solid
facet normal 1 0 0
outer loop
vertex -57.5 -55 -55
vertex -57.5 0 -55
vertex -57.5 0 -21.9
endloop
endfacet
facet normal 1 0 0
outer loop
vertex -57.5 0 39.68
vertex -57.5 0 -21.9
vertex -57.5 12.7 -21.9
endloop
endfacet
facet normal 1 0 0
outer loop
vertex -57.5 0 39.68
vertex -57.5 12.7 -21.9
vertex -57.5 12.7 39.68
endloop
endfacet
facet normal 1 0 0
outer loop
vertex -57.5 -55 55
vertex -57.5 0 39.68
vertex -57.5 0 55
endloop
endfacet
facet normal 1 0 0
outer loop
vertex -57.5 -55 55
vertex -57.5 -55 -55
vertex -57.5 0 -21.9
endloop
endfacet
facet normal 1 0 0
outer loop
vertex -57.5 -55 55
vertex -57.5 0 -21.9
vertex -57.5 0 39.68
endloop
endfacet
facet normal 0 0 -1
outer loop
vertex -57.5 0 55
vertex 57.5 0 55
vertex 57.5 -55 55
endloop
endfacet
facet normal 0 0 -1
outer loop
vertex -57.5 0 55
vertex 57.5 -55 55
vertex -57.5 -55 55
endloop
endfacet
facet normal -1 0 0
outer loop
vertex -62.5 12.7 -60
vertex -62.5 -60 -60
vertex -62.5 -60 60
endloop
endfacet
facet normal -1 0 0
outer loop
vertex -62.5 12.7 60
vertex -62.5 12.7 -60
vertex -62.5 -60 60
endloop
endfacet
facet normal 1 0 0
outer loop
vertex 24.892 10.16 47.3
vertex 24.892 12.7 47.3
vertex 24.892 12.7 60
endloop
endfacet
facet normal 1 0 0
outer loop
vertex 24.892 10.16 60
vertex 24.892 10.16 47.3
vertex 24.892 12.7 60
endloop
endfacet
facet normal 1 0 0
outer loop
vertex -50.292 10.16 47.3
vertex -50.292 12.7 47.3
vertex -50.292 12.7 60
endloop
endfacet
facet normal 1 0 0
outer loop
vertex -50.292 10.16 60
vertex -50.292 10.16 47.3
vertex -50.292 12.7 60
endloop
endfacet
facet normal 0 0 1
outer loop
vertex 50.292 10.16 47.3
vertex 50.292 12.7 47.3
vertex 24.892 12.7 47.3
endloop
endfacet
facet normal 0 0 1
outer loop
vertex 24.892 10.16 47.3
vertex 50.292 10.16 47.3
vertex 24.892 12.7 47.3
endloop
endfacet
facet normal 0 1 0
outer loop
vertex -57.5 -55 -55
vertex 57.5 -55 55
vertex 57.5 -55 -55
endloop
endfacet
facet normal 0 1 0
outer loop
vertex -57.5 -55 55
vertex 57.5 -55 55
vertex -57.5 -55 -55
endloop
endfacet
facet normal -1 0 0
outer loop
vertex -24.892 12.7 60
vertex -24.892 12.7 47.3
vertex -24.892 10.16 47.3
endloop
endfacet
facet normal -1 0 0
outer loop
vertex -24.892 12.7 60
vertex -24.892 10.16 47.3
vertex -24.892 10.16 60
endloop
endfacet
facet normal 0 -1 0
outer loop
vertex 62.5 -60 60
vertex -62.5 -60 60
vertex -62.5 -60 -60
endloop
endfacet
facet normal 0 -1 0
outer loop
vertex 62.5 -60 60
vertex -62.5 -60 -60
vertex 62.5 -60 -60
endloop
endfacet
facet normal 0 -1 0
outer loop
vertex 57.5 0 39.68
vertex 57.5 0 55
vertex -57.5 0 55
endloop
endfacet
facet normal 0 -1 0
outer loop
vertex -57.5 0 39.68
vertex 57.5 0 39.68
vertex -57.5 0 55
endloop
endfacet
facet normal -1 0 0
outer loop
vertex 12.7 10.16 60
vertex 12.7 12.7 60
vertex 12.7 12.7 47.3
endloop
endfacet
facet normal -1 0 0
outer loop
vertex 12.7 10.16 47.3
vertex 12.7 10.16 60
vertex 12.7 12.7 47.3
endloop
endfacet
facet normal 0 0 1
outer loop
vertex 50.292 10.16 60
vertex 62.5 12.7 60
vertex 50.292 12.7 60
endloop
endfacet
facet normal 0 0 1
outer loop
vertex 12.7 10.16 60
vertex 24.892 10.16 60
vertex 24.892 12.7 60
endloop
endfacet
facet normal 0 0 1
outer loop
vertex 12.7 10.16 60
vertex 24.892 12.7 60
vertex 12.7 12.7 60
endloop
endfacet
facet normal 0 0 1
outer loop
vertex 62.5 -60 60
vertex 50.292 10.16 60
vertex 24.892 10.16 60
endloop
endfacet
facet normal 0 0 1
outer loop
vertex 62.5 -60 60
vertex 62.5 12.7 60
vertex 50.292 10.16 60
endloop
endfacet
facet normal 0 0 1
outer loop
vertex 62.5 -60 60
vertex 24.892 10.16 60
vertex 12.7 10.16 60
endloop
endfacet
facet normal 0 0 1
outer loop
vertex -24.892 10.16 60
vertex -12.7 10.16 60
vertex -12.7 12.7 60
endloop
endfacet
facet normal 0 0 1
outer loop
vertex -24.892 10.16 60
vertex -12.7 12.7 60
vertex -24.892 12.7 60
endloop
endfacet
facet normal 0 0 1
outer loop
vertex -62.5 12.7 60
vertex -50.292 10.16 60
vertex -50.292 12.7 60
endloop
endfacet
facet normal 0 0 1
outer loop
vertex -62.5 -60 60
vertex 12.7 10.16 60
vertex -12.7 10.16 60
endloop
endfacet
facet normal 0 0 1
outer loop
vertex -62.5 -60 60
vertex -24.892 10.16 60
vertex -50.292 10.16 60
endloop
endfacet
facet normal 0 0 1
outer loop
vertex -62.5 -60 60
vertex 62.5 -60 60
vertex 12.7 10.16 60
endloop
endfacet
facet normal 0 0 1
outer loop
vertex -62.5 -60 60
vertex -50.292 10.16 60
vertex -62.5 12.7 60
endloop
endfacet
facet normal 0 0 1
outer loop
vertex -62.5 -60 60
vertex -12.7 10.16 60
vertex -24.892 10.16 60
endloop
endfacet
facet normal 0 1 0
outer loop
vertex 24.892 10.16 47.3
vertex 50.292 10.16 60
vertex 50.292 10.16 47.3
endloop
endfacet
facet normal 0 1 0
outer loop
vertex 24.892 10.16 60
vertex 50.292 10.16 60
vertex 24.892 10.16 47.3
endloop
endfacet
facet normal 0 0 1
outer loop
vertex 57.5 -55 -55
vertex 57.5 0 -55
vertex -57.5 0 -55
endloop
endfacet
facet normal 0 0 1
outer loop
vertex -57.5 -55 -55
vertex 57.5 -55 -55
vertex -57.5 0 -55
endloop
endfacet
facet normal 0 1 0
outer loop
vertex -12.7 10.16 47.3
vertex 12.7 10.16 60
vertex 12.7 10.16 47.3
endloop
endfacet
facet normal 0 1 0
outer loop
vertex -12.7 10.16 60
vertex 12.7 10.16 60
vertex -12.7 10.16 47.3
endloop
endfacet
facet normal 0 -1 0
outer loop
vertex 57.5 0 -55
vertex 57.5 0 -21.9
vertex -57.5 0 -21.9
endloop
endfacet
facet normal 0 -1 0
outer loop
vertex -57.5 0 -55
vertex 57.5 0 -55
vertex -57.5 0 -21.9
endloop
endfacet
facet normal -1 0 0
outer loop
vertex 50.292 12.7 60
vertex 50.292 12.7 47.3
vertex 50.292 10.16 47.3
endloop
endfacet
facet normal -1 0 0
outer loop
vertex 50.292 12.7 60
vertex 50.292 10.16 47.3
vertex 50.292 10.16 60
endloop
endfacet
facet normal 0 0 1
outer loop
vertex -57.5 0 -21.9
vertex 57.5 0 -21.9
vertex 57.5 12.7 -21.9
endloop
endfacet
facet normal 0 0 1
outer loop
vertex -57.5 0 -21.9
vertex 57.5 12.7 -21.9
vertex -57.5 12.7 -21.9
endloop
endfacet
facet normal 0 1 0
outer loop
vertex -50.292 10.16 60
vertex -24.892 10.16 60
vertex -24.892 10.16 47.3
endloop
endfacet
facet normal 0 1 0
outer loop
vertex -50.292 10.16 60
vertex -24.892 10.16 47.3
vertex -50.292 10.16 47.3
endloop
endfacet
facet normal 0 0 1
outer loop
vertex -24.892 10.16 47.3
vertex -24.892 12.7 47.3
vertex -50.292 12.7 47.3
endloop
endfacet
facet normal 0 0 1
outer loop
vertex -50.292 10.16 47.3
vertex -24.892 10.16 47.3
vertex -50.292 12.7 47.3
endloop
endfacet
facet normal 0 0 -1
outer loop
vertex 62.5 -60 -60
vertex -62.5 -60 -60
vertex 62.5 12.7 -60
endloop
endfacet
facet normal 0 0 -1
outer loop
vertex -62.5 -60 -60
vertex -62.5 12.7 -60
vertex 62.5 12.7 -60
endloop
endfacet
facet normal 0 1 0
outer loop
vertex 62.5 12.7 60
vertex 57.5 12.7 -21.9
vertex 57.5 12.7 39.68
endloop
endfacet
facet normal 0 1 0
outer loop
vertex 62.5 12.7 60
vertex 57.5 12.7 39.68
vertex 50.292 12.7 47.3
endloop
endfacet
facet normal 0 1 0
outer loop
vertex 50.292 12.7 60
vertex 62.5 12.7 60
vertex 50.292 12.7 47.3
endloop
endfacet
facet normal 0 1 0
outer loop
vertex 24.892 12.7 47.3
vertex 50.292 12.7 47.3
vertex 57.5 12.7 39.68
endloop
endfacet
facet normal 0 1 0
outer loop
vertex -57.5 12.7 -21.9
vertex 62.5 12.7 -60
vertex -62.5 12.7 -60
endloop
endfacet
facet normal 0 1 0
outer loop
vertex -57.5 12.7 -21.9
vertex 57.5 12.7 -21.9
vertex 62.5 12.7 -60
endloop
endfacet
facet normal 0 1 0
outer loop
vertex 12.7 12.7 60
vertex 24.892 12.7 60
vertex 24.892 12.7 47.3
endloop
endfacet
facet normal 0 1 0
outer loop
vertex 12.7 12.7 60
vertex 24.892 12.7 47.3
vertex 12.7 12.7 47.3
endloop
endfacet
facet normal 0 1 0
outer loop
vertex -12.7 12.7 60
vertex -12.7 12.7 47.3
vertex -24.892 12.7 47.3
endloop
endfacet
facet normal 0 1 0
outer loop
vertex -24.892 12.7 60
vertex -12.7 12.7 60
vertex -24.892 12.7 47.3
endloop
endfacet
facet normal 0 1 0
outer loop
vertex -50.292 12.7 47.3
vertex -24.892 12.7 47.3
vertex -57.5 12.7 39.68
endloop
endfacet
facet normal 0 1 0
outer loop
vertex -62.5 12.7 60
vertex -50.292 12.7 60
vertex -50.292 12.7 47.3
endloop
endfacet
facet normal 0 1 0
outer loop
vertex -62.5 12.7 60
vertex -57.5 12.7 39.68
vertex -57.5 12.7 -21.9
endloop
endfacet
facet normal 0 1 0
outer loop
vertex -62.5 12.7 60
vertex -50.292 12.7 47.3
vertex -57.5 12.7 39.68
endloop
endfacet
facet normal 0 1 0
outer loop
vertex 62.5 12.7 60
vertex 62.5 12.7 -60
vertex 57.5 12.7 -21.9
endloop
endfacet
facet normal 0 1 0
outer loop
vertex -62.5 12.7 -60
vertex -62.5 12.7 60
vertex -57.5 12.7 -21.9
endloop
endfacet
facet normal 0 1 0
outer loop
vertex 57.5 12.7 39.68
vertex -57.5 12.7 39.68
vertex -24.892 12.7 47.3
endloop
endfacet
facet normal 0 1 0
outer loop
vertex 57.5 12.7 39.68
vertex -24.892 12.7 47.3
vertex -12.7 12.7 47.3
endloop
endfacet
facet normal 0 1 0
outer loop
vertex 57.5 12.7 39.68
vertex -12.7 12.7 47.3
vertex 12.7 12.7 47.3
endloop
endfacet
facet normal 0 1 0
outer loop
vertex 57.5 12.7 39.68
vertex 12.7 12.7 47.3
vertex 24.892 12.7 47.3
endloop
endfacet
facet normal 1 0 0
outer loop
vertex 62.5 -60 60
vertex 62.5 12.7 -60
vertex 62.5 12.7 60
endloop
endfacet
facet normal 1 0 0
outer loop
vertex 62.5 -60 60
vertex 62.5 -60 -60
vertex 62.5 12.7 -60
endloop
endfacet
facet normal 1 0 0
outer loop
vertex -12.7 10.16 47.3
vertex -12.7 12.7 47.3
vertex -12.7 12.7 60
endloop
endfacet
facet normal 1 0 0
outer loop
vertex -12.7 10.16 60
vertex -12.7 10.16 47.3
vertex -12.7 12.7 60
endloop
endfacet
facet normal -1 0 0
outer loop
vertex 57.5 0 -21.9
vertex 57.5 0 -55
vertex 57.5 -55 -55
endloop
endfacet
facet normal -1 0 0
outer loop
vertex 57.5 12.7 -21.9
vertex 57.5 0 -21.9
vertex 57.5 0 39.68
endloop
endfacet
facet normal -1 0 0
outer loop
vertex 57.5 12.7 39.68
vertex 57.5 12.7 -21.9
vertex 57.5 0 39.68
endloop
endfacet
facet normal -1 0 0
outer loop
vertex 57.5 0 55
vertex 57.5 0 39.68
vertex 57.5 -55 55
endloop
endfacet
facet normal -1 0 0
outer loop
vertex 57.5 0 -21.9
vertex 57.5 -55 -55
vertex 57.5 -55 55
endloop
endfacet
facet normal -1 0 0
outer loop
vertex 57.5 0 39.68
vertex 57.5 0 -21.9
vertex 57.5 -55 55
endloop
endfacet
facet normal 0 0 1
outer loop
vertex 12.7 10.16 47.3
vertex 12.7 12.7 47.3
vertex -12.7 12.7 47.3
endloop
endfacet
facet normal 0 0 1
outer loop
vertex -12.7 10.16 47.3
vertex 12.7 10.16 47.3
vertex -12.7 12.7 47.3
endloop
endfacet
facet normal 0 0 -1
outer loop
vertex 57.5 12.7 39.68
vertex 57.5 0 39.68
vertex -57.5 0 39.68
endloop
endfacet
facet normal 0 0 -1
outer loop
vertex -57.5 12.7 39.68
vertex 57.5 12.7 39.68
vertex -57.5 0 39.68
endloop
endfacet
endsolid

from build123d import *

# Parameters (mm, degrees)
F0_W     = 125
F0_H     = 120
F1_DEPTH = 60
F2_W     = 125
F2_H     = 20.32
F2_H_2   = 38.1
F3_DEPTH = 12.7
F4_W     = 115
F4_H     = 110
F5_DEPTH = 55
F6_W     = 25.4
F6_H     = 12.7
F7_DEPTH = 2.54
F8_W     = 5
F8_H     = 61.58
F9_DEPTH = 12.7


with BuildPart() as f1:
    # F0 (on Front) → F1 (new body)
    with BuildSketch(Plane.XZ):
        Rectangle(F0_W, F0_H)
    extrude(amount=F1_DEPTH)

    # F2 (on face) → F3 (join)
    with BuildSketch(Plane(origin=(0, 0, 0), x_dir=(-1, 0, 0), z_dir=(0, 1, 0))):
        with Locations((0, 49.84)):
            Rectangle(F2_W, F2_H)
        with Locations((0, -40.95)):
            Rectangle(F2_W, F2_H_2)
    extrude(amount=F3_DEPTH)

    # F4 (on face) → F5 (cut)
    with BuildSketch(Plane(origin=(0, 0, 0), x_dir=(-1, 0, 0), z_dir=(0, 1, 0))):
        Rectangle(F4_W, F4_H)
    extrude(amount=-F5_DEPTH, mode=Mode.SUBTRACT)

    # F6 (on face) → F7 (cut)
    with BuildSketch(Plane(origin=(0, 12.7, 0), x_dir=(-1, 0, 0), z_dir=(0, 1, 0))):
        with Locations((-37.592, 53.65)):
            Rectangle(F6_W, F6_H)
        Polygon((12.7, 60), (0, 60), (-12.7, 60), (-12.7, 47.3), (0, 47.3), (12.7, 47.3), align=None)
        with Locations((37.592, 53.65)):
            Rectangle(F6_W, F6_H)
    extrude(amount=-F7_DEPTH, mode=Mode.SUBTRACT)

    # F8 (on face) → F9 (join)
    with BuildSketch(Plane(origin=(0, 0, 0), x_dir=(-1, 0, 0), z_dir=(0, 1, 0))):
        with Locations((60, 8.89)):
            Rectangle(F8_W, F8_H)
        with Locations((-60, 8.89)):
            Rectangle(F8_W, F8_H)
    extrude(amount=F9_DEPTH)


solid = f1.part
